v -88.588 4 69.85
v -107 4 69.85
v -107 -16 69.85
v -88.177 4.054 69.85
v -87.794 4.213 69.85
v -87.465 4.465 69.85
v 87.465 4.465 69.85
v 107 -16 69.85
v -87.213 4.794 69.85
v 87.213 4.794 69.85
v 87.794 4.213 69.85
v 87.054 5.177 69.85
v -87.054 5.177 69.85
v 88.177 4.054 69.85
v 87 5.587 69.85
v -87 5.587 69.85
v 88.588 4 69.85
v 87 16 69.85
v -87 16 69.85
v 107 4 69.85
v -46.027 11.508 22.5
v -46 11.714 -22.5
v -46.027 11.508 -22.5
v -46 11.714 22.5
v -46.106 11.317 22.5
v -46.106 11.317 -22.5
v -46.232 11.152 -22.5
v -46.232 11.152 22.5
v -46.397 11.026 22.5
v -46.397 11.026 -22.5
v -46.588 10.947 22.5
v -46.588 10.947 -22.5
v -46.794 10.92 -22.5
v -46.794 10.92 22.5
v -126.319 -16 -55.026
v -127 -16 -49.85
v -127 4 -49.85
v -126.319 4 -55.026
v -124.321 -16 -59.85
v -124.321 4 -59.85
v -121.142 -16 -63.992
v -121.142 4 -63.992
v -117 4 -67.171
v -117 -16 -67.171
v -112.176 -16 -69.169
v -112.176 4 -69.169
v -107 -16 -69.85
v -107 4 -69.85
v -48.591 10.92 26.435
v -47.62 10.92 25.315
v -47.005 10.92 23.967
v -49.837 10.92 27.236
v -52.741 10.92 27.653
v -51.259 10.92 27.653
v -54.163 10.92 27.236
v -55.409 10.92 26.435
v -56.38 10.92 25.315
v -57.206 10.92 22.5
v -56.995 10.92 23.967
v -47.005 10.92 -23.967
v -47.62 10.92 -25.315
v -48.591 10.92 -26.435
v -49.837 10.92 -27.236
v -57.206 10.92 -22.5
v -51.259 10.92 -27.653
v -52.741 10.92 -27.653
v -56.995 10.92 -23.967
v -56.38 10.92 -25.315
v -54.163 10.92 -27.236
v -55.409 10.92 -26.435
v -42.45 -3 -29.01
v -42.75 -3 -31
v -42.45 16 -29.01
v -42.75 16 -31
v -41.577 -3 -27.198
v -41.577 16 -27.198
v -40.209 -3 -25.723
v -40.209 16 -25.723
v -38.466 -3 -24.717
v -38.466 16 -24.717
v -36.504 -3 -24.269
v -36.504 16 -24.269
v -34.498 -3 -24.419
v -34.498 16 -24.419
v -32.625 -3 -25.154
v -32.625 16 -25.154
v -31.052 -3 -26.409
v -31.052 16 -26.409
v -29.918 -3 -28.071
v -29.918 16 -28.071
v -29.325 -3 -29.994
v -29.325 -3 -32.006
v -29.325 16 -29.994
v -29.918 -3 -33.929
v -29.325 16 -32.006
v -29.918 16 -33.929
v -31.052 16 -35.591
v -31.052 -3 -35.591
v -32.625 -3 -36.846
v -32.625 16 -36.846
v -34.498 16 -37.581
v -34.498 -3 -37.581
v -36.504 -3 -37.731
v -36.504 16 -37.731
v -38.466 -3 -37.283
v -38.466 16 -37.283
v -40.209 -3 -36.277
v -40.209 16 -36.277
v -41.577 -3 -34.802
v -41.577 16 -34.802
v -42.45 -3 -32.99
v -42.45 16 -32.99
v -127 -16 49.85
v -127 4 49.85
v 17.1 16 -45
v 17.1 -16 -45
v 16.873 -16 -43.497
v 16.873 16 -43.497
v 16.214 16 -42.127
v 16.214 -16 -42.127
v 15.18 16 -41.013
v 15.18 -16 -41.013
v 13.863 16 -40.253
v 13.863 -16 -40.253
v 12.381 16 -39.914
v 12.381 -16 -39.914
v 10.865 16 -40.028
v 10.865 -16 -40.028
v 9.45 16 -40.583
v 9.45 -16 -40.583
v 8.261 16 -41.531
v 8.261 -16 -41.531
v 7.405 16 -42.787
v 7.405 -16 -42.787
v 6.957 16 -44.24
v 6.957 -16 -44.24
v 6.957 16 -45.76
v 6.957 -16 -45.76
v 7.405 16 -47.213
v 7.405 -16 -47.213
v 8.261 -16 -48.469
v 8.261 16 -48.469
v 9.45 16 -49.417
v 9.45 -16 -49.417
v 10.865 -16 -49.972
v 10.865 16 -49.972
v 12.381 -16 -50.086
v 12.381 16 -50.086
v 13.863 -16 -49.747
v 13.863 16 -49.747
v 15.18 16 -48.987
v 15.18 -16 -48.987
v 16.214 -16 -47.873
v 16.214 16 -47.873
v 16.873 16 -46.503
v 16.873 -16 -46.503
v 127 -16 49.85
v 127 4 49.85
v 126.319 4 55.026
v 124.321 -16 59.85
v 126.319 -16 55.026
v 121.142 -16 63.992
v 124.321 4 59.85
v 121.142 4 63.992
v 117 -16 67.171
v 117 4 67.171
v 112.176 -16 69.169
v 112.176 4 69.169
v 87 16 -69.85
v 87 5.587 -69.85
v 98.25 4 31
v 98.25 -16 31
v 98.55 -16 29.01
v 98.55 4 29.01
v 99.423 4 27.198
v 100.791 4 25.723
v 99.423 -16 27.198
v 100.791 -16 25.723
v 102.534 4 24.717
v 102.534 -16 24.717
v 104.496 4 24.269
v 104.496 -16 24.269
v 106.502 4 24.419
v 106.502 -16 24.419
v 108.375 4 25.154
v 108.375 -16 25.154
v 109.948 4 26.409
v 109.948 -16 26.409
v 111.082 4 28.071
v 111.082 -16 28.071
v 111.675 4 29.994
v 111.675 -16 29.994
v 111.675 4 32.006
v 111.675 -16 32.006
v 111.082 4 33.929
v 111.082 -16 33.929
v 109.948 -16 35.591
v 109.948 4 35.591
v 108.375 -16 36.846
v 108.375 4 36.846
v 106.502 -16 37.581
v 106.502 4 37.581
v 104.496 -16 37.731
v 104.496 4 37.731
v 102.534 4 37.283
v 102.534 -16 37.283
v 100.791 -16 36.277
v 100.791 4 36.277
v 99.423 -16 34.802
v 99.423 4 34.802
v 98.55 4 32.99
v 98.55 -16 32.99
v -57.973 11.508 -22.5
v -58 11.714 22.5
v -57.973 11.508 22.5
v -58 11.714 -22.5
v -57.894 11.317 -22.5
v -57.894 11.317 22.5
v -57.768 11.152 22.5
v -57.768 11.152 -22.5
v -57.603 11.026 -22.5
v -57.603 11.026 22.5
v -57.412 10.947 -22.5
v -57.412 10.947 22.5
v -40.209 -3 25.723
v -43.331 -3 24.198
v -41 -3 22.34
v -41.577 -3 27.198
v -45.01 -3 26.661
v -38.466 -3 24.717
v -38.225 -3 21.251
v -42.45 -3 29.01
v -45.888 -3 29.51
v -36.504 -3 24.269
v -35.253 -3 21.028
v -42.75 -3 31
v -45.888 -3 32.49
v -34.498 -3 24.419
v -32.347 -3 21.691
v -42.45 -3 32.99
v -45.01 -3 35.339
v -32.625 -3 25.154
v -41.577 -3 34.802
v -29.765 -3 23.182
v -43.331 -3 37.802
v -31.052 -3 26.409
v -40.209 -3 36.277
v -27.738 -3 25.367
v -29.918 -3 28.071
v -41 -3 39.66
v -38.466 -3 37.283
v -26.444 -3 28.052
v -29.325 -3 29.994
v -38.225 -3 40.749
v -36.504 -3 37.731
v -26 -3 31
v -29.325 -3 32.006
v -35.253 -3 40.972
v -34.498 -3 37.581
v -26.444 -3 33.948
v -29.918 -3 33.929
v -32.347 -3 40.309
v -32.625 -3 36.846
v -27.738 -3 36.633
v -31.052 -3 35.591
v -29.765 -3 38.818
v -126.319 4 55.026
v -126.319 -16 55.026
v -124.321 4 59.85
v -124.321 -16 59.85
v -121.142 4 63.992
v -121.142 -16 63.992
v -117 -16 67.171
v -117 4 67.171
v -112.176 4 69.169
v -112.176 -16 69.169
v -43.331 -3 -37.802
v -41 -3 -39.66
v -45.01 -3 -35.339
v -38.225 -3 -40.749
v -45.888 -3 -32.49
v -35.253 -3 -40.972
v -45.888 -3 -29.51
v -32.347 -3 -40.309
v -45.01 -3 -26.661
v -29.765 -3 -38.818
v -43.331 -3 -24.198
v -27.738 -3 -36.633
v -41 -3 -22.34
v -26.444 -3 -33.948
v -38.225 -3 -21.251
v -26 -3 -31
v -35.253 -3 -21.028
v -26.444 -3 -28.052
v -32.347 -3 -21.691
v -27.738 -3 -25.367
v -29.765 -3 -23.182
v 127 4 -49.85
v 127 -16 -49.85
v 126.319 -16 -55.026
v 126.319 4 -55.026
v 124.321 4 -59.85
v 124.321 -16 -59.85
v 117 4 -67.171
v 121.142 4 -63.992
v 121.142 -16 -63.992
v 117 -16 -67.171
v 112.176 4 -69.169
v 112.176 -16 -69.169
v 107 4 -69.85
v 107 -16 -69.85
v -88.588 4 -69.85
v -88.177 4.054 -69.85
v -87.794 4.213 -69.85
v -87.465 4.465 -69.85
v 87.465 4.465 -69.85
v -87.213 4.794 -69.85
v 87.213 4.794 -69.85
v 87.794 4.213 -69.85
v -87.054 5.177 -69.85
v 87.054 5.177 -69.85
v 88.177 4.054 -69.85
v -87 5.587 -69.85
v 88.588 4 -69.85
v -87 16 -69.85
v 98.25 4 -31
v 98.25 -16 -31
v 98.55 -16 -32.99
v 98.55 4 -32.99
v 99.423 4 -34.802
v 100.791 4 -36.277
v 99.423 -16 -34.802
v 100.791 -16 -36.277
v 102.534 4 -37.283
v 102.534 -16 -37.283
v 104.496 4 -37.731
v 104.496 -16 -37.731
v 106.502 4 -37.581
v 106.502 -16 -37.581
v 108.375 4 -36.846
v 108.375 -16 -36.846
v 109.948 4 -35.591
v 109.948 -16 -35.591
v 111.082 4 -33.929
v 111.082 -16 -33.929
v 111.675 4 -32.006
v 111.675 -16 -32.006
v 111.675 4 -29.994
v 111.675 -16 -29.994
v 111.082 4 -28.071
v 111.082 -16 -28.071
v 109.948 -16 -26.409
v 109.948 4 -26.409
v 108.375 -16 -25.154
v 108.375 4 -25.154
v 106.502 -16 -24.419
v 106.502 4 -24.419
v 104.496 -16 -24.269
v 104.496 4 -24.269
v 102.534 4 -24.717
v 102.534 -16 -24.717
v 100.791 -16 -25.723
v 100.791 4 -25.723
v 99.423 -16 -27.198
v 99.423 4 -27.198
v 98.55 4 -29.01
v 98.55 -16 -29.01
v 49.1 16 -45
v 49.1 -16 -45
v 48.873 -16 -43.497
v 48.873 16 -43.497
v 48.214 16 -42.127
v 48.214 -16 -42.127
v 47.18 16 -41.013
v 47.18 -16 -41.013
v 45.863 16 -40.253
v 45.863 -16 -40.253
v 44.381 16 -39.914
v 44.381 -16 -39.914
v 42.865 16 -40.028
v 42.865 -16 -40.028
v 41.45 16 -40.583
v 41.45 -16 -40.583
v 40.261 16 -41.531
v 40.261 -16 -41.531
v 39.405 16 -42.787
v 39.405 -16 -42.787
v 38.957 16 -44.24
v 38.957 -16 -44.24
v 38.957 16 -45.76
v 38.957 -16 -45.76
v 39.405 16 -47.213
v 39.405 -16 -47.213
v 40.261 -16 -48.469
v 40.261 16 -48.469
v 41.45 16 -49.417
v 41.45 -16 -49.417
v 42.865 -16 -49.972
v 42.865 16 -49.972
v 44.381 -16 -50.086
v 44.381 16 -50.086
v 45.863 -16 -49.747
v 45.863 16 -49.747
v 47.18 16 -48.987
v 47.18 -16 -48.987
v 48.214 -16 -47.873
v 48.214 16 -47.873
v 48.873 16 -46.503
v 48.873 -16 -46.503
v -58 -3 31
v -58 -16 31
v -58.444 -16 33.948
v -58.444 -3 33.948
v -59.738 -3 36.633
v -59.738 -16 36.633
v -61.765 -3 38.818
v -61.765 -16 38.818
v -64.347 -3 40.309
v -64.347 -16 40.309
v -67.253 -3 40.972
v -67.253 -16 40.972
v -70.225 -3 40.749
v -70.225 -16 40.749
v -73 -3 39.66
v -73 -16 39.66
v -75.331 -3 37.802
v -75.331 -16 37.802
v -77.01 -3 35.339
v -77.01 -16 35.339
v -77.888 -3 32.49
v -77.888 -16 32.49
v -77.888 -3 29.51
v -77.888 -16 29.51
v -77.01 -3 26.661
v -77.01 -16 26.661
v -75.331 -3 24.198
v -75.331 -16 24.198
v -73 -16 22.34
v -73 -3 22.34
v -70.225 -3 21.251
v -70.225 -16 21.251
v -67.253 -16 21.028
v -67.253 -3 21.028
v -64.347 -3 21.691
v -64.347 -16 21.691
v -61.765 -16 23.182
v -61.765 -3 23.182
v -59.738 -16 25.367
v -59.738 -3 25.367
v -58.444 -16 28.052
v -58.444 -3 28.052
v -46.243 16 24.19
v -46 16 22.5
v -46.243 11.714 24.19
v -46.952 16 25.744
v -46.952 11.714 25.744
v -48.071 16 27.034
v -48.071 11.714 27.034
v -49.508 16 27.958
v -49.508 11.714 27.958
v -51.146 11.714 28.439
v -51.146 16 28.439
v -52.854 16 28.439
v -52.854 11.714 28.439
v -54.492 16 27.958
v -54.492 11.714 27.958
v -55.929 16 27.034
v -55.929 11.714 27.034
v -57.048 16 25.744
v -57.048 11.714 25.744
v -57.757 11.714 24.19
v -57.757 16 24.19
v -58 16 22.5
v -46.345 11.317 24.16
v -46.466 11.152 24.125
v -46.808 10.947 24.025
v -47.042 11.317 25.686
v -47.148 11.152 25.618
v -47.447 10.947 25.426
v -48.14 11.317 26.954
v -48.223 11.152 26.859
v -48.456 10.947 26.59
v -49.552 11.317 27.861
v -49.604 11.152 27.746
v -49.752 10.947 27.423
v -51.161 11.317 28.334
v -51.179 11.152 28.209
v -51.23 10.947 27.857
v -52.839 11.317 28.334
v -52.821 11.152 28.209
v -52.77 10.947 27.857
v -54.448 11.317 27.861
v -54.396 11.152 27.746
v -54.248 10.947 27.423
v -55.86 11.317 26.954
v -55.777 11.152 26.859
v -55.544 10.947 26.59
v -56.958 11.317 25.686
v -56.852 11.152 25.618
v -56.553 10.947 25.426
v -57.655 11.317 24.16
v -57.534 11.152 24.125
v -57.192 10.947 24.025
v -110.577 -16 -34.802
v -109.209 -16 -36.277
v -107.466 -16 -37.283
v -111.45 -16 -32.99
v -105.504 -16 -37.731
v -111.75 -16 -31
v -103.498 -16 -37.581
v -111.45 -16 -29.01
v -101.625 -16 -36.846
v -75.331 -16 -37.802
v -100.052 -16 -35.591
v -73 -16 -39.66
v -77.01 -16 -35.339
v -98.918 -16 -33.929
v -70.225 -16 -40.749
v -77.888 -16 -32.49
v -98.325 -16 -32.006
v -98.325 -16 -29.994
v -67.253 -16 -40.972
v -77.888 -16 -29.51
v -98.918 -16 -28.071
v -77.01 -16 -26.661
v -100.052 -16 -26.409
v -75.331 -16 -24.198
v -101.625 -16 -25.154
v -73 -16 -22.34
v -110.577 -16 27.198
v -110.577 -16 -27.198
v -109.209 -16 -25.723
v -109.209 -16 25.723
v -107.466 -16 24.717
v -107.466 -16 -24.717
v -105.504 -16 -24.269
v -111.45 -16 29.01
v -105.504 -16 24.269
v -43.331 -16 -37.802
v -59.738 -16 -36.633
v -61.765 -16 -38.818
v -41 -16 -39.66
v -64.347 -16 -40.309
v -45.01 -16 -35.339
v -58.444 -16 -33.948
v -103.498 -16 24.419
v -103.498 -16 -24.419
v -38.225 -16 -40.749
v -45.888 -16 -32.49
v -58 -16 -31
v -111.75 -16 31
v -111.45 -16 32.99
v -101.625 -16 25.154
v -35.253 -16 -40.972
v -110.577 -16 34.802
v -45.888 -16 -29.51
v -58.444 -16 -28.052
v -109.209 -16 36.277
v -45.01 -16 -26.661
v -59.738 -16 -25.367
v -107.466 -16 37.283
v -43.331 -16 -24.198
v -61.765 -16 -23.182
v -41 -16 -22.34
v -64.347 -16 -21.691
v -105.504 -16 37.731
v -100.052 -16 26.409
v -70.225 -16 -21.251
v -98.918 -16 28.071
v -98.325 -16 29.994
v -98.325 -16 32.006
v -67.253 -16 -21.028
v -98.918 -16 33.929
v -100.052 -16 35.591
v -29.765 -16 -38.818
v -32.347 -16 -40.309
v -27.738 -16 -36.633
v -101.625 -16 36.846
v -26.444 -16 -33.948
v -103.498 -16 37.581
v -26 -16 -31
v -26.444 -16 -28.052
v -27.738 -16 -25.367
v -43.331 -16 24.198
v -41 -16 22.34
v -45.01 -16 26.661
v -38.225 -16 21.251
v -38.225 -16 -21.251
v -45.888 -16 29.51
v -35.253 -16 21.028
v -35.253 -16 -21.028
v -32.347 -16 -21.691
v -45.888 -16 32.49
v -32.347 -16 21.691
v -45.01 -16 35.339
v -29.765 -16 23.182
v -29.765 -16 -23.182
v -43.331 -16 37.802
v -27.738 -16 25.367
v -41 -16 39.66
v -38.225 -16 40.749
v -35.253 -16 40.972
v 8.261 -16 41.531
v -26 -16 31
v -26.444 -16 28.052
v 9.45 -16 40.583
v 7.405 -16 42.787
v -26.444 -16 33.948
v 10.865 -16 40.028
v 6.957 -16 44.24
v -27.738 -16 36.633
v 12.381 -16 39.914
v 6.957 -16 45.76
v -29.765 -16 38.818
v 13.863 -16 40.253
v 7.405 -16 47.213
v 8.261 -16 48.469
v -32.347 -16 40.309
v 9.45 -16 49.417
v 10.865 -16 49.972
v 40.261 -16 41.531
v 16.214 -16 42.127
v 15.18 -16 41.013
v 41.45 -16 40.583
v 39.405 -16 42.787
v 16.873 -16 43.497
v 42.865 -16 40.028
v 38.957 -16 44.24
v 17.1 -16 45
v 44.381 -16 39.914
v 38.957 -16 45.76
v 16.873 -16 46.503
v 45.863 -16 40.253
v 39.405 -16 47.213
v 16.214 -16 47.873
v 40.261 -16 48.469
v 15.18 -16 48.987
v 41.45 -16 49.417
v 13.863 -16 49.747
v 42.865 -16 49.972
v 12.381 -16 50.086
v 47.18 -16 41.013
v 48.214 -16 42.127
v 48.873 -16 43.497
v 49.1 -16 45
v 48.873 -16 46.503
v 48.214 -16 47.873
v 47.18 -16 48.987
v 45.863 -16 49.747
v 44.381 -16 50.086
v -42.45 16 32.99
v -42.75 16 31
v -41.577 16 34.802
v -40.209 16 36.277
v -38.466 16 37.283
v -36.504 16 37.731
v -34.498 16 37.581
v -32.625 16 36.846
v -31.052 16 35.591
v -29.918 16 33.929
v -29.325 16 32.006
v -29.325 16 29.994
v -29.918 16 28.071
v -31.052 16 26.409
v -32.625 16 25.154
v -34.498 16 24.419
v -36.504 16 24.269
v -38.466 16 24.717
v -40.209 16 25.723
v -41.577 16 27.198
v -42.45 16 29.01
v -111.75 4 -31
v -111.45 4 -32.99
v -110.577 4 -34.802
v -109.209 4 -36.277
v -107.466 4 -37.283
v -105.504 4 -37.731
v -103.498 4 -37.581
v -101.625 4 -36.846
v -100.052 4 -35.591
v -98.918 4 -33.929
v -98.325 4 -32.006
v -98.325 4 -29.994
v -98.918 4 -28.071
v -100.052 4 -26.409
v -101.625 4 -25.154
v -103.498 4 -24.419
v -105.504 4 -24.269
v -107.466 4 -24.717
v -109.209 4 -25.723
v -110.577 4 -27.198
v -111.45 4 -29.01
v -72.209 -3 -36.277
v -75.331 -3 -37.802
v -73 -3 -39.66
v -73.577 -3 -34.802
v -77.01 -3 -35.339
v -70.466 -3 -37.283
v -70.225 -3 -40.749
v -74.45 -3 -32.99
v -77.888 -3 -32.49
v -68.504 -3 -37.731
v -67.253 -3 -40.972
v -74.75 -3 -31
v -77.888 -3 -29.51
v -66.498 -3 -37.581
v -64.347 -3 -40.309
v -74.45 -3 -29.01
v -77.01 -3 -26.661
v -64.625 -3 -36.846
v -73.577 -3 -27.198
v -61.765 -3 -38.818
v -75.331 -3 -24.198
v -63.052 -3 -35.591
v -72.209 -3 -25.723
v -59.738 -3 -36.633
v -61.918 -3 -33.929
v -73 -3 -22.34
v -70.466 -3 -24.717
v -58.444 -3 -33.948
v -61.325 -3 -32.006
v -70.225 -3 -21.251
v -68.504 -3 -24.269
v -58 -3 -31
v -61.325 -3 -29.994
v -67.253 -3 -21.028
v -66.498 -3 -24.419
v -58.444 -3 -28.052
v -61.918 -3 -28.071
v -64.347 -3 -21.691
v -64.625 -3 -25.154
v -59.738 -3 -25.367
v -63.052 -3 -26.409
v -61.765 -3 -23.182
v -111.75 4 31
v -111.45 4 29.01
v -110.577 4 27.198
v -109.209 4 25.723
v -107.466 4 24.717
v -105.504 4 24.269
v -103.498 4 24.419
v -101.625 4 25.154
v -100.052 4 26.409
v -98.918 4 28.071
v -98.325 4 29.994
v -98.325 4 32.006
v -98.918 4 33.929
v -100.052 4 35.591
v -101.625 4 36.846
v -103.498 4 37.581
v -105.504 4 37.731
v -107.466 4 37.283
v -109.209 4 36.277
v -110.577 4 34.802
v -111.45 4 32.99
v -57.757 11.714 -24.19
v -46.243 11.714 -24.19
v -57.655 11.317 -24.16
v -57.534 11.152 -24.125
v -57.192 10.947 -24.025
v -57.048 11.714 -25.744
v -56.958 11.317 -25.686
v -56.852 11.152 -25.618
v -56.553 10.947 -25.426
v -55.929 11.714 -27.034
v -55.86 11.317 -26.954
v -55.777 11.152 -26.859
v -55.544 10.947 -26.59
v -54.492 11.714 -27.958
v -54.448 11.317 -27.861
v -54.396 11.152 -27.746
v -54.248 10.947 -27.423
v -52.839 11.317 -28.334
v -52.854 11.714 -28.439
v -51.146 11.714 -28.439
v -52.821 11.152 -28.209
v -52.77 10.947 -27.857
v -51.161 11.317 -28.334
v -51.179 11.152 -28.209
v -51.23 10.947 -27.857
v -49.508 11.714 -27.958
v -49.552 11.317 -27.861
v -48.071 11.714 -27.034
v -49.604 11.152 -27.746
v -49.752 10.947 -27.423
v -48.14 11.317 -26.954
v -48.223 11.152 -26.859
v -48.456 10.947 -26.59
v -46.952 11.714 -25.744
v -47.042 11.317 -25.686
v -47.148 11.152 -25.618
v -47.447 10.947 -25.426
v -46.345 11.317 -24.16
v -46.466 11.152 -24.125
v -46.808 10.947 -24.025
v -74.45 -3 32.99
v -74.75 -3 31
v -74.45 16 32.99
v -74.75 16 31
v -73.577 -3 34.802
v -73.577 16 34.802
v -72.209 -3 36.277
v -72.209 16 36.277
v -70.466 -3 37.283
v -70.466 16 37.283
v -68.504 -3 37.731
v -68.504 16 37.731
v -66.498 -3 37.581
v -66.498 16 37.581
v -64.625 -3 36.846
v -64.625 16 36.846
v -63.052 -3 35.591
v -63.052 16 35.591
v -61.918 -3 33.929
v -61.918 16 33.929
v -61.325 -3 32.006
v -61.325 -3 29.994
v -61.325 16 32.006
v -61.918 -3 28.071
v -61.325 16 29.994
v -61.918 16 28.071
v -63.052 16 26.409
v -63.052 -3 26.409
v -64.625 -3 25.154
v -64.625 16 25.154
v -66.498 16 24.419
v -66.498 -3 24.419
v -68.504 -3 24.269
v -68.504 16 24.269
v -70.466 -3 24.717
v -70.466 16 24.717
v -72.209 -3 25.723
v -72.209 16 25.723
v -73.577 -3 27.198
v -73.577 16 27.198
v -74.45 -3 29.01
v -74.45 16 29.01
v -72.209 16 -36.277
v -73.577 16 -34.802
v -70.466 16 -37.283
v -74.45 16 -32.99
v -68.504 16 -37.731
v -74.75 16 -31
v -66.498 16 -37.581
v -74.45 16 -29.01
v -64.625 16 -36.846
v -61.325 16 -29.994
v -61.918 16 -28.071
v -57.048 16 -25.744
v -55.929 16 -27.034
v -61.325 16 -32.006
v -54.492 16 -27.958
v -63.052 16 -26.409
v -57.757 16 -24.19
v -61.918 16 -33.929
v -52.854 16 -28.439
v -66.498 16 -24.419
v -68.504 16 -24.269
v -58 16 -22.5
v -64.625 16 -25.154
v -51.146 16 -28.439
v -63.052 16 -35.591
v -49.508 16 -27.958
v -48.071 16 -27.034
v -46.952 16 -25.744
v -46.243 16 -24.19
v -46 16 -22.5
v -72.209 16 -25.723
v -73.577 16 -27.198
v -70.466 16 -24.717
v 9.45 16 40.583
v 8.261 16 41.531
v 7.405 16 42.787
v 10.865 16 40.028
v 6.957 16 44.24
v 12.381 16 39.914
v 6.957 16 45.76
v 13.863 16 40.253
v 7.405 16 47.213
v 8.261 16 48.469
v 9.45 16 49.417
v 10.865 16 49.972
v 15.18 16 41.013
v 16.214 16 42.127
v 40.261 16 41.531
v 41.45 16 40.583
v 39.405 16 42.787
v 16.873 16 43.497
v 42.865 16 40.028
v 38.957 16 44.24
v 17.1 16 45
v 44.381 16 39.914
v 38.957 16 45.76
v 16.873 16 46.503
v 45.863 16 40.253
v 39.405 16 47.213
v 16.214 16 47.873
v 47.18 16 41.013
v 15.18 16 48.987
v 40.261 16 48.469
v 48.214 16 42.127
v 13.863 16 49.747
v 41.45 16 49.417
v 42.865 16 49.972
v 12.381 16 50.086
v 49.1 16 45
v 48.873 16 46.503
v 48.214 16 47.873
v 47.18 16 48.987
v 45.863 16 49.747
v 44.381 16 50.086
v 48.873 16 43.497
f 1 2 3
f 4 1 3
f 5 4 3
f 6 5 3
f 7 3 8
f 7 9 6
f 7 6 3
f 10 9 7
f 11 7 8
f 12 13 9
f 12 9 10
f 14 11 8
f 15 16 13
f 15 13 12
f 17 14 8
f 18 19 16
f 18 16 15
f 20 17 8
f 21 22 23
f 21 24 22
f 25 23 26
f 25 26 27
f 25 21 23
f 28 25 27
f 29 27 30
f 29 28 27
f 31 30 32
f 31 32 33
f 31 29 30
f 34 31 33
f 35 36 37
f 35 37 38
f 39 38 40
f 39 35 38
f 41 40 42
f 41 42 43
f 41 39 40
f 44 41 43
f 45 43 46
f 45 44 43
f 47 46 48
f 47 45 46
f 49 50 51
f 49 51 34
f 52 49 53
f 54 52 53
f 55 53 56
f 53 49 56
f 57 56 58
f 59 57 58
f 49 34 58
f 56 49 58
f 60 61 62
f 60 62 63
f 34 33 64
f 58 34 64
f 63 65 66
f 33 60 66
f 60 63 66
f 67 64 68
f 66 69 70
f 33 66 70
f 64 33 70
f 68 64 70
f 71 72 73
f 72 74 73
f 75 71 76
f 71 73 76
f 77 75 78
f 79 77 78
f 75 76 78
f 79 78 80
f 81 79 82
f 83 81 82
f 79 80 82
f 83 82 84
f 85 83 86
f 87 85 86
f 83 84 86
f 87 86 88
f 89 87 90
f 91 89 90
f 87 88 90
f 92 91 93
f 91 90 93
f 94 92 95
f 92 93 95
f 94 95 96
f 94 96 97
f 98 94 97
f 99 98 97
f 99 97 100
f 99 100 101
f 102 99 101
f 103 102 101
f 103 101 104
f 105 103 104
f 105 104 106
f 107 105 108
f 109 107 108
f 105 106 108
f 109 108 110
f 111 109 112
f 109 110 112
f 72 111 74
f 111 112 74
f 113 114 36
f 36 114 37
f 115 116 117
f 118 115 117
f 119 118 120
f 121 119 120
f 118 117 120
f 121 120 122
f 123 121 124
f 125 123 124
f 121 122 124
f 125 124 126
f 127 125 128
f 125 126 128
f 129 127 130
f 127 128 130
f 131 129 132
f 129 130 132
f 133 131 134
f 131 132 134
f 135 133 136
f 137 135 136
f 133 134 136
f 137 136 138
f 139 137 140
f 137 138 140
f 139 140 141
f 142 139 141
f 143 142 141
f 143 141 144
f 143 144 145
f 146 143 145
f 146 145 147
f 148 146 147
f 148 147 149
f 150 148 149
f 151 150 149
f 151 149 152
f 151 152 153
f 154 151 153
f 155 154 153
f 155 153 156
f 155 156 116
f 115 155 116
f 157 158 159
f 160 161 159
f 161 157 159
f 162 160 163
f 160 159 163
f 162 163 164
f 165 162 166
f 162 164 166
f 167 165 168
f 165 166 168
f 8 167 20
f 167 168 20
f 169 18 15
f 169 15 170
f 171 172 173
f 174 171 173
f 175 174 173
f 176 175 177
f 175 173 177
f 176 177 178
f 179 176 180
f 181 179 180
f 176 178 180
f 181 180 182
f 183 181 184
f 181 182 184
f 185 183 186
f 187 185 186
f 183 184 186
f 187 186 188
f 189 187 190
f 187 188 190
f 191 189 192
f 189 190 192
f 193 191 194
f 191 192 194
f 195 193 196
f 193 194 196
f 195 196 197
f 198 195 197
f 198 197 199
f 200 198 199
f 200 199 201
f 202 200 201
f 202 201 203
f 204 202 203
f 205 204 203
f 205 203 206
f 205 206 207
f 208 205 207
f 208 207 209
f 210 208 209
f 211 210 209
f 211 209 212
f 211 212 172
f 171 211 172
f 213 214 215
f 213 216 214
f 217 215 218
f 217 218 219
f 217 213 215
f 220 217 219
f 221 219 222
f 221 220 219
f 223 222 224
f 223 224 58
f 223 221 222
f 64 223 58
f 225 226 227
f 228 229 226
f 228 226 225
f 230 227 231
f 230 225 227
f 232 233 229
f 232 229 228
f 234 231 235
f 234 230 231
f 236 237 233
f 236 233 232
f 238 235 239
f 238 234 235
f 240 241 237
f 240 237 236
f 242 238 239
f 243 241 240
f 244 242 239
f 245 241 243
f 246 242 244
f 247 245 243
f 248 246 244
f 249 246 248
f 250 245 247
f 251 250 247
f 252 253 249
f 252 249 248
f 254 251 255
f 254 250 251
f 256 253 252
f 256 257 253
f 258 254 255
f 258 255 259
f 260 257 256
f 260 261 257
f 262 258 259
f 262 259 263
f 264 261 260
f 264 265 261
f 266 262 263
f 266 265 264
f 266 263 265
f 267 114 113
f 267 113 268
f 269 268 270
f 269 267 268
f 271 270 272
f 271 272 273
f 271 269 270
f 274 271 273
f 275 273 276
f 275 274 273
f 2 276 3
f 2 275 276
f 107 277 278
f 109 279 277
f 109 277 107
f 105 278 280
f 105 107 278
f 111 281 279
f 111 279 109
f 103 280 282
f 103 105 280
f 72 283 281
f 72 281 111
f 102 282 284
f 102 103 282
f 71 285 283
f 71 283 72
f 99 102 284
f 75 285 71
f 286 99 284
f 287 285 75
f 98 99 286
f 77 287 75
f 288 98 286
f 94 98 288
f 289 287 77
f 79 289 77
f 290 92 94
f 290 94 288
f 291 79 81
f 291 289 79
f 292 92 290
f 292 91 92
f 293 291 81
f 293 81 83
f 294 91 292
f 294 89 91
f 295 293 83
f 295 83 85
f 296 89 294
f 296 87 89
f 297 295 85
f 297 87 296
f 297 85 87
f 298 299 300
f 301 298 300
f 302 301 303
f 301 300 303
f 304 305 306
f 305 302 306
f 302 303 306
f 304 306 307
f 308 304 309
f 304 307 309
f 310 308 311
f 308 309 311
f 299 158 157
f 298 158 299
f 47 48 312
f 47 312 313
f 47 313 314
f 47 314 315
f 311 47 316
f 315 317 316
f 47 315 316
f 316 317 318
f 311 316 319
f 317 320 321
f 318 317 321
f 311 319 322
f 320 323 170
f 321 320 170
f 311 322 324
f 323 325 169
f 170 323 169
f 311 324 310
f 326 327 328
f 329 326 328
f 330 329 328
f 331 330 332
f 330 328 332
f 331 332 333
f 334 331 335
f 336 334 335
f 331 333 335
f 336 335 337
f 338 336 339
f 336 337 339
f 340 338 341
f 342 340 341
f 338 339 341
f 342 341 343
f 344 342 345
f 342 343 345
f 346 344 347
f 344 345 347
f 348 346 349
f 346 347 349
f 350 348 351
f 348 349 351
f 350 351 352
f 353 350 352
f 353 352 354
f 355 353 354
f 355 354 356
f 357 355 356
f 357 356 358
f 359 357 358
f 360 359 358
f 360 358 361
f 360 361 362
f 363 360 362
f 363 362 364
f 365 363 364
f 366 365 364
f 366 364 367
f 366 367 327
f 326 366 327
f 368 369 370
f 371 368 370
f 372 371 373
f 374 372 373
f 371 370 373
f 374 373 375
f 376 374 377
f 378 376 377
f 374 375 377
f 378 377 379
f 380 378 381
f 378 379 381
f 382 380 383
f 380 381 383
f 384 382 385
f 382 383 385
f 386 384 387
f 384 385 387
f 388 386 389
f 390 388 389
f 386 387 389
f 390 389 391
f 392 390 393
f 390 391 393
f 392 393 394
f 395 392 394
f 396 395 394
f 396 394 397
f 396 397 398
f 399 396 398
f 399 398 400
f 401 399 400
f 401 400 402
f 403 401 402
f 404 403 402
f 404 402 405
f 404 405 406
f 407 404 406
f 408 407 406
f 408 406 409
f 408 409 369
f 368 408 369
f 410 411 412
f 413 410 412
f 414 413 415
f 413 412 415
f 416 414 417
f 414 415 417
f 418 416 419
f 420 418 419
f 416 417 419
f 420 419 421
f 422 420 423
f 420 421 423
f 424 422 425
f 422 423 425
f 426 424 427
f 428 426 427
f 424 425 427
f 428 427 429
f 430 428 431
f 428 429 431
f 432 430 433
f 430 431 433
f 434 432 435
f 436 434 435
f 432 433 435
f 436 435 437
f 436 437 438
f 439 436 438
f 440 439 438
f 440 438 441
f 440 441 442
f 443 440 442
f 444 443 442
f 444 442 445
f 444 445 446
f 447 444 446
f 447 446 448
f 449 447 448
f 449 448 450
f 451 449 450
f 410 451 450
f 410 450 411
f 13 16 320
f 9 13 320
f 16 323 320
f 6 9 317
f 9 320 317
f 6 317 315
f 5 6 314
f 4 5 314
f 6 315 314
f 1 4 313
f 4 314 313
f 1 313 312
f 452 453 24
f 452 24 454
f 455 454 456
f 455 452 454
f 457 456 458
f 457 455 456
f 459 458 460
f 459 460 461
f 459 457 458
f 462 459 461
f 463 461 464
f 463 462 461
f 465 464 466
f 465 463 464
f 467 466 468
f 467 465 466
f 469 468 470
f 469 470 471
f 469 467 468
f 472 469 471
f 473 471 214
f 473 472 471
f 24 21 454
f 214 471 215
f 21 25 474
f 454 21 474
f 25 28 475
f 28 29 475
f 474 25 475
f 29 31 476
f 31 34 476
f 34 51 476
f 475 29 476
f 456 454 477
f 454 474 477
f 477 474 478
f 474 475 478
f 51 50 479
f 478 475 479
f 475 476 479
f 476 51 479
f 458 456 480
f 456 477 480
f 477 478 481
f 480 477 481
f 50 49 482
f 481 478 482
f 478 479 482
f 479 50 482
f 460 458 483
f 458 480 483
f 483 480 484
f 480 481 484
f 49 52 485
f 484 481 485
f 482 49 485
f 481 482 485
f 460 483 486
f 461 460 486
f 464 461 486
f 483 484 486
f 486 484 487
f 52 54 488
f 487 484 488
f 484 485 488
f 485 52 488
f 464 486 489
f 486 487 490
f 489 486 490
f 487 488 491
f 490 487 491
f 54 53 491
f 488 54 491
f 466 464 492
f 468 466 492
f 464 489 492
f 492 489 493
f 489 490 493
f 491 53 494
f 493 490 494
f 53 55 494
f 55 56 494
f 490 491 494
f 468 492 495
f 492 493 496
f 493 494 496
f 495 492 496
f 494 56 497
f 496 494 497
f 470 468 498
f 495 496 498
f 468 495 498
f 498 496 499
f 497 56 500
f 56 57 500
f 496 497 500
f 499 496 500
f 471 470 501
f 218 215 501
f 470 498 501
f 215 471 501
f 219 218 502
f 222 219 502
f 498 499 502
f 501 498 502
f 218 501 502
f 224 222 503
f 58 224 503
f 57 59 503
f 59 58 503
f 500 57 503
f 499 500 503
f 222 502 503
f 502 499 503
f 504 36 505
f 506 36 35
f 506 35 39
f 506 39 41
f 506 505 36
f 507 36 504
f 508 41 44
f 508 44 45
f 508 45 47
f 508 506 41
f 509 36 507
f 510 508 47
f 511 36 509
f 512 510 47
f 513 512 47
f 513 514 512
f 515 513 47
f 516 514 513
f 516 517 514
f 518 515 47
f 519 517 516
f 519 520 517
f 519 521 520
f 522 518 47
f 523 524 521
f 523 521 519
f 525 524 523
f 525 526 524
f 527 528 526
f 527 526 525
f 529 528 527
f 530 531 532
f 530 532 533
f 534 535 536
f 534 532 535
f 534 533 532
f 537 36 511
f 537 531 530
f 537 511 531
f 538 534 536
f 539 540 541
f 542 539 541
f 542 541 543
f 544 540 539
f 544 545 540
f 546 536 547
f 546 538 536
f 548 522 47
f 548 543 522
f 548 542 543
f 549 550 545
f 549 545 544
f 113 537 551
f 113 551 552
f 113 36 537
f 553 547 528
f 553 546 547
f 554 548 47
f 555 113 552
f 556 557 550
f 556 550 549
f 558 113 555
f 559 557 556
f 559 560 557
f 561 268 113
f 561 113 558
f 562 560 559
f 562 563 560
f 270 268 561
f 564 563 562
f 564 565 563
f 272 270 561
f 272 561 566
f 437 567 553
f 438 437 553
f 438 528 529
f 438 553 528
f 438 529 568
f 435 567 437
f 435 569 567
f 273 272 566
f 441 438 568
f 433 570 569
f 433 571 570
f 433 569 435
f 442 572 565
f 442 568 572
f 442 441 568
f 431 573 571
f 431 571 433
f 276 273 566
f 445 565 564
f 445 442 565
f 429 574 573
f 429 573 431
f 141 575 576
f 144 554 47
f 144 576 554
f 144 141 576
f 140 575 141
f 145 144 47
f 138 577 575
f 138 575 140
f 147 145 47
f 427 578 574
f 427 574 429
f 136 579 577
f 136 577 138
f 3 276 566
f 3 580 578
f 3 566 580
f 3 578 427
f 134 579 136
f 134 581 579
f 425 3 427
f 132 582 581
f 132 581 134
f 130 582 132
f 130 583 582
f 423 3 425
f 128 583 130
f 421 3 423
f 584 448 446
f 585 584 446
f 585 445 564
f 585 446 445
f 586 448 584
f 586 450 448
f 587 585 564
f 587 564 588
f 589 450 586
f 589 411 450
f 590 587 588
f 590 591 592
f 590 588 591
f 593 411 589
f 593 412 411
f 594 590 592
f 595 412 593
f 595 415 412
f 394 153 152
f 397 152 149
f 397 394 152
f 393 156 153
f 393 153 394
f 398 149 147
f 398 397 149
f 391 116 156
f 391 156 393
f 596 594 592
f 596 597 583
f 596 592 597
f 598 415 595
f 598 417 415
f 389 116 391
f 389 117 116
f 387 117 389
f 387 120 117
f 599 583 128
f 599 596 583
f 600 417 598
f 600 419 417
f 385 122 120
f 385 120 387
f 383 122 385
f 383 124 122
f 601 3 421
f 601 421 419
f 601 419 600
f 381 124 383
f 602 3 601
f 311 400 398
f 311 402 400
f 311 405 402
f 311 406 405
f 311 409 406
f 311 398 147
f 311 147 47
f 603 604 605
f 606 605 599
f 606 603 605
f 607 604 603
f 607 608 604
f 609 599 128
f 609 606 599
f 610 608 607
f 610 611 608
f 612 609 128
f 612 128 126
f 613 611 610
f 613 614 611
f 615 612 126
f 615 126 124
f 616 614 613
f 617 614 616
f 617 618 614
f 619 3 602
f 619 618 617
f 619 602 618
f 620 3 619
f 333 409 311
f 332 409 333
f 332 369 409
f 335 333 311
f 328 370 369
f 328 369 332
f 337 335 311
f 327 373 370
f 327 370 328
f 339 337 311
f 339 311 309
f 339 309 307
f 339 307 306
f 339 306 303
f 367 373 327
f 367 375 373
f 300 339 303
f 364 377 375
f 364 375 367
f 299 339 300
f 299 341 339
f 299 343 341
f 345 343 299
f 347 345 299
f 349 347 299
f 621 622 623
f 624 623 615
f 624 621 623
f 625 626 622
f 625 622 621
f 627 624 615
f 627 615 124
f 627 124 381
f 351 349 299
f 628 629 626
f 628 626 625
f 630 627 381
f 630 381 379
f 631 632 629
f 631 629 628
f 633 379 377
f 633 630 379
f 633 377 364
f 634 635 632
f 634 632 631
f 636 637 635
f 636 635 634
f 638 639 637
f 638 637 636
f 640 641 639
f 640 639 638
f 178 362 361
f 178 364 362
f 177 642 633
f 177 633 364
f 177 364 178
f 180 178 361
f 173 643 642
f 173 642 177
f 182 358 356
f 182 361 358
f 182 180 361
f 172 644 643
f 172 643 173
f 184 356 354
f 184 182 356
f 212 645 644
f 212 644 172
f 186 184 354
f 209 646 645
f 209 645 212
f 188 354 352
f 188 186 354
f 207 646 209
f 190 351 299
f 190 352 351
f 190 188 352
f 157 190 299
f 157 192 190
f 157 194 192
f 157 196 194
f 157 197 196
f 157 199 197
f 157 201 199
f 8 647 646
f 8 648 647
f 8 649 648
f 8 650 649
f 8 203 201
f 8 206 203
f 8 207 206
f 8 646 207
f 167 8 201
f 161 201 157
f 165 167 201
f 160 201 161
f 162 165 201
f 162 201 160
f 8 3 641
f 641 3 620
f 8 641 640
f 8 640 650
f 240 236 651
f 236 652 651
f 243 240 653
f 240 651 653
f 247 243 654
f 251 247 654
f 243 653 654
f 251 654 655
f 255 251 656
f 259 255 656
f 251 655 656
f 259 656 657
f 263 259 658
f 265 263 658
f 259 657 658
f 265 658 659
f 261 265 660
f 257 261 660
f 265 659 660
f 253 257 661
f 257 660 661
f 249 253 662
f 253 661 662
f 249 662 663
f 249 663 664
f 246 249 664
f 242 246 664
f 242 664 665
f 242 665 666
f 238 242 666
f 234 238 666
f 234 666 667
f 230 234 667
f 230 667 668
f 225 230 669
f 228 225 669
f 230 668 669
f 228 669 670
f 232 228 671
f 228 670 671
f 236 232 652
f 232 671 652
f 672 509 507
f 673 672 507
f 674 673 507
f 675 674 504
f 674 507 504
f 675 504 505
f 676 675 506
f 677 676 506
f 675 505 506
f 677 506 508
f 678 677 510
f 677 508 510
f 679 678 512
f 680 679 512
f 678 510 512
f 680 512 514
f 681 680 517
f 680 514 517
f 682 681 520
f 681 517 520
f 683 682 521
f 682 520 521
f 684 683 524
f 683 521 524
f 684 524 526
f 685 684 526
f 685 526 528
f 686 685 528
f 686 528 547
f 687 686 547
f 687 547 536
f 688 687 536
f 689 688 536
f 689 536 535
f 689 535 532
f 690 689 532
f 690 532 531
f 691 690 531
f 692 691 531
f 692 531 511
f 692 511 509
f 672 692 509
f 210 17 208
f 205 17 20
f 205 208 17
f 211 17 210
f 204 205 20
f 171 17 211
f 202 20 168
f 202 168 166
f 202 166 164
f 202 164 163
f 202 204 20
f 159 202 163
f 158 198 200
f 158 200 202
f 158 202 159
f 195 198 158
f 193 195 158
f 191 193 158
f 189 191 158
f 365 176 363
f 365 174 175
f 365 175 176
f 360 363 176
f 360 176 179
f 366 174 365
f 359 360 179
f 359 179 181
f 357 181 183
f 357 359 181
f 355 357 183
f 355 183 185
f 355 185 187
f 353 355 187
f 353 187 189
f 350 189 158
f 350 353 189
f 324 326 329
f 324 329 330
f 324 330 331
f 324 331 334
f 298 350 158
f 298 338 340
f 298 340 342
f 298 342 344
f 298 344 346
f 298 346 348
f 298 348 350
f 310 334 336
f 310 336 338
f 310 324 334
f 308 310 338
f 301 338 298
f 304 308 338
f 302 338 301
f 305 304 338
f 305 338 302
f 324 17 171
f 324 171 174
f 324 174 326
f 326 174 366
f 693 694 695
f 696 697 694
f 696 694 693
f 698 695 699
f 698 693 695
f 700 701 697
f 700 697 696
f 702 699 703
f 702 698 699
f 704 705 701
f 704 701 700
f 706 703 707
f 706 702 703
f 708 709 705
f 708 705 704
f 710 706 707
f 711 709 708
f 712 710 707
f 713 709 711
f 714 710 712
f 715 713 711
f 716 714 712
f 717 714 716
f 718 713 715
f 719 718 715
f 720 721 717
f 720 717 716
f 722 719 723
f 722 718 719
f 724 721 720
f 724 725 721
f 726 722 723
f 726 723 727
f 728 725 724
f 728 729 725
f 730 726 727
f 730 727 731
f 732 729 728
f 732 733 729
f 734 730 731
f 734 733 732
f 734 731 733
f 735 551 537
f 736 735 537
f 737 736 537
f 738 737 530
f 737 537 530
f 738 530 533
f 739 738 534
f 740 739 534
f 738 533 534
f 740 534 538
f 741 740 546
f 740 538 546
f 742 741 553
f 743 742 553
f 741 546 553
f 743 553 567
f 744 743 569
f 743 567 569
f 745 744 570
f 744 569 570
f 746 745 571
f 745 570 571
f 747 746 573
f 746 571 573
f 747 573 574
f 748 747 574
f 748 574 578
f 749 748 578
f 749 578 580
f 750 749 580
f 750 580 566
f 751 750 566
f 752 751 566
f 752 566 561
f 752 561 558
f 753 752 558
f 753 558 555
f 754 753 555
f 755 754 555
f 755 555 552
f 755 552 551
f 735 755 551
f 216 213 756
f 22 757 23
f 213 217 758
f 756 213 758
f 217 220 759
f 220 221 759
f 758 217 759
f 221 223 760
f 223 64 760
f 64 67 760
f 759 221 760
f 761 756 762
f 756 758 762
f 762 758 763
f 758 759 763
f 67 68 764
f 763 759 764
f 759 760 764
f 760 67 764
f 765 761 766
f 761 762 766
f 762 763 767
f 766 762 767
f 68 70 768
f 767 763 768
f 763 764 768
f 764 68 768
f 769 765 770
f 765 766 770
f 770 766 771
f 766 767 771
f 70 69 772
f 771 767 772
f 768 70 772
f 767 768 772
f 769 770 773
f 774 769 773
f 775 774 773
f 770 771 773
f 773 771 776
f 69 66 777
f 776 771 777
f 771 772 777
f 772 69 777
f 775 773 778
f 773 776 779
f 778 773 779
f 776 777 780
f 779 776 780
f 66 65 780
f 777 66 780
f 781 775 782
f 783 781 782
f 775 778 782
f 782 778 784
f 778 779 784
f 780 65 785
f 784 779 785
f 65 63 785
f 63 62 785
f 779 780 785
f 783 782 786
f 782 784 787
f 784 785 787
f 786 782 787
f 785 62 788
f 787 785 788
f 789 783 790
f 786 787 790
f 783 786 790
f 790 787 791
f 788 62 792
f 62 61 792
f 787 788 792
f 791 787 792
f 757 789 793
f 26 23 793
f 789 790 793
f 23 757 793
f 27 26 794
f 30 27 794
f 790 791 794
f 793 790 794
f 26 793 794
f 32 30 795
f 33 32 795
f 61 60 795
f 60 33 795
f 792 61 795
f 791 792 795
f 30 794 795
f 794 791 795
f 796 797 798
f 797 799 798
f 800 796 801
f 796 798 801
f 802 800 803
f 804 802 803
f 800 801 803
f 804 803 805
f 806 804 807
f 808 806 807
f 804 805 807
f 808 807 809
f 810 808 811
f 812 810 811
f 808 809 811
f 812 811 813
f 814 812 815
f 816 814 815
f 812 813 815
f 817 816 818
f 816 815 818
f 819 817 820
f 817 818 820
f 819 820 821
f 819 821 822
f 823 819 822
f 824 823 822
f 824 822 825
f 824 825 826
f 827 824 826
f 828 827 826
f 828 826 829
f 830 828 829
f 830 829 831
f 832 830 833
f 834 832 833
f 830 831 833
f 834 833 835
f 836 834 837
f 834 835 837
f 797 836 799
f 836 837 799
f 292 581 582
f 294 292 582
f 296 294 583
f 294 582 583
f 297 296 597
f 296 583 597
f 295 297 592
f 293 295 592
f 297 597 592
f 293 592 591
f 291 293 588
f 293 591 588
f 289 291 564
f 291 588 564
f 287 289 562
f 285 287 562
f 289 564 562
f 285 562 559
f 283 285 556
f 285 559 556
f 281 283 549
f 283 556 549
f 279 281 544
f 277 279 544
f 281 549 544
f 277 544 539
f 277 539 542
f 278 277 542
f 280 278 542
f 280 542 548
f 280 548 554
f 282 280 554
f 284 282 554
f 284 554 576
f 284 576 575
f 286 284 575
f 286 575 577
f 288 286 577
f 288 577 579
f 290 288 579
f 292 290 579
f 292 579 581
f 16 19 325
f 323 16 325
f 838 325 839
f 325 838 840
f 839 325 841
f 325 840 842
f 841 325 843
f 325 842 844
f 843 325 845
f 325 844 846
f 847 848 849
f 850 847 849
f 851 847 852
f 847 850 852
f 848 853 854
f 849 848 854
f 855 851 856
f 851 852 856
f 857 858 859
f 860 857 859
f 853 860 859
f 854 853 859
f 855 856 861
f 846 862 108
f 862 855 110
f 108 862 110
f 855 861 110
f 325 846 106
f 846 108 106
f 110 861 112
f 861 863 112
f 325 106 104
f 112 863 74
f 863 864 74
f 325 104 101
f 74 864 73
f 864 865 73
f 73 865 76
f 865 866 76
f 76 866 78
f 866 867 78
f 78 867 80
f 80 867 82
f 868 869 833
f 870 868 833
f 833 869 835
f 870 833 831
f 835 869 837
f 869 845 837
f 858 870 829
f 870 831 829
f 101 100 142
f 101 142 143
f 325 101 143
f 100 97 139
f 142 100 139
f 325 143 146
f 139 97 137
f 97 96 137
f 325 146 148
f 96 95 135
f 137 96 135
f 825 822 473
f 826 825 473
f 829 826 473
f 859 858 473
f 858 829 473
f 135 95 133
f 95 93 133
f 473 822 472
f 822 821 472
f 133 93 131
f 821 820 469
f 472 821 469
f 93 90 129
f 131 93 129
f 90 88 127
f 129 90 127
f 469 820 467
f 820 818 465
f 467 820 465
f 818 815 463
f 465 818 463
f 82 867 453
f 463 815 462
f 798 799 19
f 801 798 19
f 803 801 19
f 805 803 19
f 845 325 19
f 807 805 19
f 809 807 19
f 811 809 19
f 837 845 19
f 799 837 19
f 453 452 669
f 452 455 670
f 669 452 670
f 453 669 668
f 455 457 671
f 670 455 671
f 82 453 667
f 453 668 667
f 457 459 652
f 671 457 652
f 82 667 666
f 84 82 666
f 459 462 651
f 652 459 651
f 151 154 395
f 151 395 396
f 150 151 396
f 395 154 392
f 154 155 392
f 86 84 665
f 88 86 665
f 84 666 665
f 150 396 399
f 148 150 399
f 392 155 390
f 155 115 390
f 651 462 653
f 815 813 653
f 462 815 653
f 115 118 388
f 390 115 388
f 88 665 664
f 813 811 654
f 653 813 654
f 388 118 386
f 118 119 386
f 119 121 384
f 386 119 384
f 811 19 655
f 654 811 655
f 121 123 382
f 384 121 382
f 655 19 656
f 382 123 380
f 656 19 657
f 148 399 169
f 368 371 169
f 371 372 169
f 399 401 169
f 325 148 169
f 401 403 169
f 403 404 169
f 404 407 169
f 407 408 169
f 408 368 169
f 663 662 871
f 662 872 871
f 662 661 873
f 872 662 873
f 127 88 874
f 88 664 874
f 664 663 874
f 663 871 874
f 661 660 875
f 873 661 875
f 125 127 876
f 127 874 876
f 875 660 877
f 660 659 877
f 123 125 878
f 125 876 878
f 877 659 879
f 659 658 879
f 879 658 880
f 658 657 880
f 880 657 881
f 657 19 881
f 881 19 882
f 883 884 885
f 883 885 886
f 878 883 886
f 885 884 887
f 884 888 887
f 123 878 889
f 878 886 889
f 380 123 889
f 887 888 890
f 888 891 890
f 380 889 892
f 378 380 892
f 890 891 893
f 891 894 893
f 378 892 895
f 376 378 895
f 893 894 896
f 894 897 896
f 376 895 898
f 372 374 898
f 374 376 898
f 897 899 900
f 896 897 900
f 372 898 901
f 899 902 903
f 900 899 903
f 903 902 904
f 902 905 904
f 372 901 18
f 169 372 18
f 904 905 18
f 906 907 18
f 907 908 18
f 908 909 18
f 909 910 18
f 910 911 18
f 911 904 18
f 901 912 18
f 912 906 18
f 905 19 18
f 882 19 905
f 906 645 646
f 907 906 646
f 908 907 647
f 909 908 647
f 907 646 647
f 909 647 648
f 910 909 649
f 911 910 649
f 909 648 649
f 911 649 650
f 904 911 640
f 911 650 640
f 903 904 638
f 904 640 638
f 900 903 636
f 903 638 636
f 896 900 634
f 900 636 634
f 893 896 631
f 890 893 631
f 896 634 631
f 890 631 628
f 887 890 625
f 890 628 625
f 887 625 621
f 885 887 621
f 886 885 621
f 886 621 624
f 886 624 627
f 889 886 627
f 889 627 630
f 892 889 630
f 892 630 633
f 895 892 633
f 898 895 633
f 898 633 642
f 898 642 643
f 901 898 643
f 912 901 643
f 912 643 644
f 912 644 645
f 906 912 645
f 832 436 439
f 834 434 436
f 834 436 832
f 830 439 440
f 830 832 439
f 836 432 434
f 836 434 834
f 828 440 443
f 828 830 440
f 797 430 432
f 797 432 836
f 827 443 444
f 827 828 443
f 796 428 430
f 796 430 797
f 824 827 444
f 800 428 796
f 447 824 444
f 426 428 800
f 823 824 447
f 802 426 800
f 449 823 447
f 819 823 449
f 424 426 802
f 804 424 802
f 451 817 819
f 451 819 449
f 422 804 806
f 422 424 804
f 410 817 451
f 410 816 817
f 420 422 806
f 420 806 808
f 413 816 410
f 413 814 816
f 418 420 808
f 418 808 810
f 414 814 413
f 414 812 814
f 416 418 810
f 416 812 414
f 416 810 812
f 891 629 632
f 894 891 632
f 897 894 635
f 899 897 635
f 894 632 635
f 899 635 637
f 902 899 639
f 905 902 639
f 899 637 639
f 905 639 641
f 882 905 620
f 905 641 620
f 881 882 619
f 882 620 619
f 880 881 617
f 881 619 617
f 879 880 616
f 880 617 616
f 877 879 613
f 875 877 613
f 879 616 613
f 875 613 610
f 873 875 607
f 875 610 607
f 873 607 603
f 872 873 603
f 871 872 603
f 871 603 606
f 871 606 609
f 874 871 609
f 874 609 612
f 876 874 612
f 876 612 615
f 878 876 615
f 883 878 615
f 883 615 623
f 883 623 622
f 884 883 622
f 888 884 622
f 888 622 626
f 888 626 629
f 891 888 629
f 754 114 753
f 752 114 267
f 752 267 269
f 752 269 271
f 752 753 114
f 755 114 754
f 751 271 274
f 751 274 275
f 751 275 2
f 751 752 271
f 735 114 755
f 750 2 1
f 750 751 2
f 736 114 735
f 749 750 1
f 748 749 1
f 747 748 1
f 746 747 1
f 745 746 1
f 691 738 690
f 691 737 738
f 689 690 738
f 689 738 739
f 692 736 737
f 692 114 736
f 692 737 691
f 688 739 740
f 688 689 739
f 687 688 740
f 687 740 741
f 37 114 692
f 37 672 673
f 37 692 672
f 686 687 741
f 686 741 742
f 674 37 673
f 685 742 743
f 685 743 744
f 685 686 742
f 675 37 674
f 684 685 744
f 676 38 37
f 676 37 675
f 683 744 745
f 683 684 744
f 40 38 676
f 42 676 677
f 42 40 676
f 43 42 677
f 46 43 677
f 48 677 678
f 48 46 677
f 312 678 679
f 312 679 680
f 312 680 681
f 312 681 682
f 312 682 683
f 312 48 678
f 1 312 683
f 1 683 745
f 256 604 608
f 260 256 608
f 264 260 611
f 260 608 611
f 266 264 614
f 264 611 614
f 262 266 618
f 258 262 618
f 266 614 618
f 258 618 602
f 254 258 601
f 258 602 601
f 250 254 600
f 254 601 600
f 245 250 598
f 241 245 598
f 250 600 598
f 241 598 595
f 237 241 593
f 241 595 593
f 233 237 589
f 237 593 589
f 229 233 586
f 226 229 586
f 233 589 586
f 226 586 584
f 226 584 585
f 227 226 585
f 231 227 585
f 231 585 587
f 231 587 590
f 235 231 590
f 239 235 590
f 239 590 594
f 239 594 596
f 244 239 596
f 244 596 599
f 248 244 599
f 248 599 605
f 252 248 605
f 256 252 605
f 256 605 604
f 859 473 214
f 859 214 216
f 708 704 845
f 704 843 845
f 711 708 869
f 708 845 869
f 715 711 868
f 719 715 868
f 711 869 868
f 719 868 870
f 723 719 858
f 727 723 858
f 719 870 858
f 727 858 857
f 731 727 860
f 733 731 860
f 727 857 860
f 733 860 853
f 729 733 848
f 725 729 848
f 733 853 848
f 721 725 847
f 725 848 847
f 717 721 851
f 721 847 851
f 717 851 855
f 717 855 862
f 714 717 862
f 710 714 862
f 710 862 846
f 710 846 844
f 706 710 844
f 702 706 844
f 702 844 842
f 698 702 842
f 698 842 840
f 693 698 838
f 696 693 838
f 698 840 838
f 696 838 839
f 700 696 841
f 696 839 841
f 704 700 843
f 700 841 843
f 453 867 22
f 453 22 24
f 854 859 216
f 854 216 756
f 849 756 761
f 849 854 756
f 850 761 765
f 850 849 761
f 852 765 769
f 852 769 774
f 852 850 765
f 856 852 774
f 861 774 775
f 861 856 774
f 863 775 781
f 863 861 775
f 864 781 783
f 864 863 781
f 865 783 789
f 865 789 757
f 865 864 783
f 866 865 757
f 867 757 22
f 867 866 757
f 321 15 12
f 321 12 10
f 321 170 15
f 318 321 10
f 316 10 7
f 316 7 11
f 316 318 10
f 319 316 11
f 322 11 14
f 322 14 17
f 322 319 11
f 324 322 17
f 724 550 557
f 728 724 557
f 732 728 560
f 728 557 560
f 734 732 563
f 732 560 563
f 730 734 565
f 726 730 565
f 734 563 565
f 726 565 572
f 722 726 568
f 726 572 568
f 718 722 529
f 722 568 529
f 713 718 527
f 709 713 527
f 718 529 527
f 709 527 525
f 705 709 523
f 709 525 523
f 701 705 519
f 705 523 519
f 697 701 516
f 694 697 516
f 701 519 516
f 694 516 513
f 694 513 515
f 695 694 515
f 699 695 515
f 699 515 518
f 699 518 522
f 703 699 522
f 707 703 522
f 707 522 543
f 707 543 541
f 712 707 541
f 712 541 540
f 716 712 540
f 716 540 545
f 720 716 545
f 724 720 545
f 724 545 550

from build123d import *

# Parameters (mm, degrees)
SKETCH1_W                                            = 254
SKETCH1_H                                            = 139.7
BOSS_EXTRUDE1_DEPTH                                  = 19.05
FILLET1_R                                            = 20
SKETCH2_W                                            = 254
SKETCH2_H                                            = 3.05
CUT_EXTRUDE1_DEPTH                                   = 190.757720528
SKETCH8_W                                            = 40
SKETCH8_H                                            = 139.7
CUT_EXTRUDE2_DEPTH                                   = 12
M12_TAPPED_HOLE2_D                                   = 10.2
M12_TAPPED_HOLE2_DEPTH                               = 43.99
M12_TAPPED_HOLE2_TIP                                 = 3.064389157
M12_CLEARANCE_HOLE1_D                                = 13.5
CBORE_FOR_M12_HEX_SOCKET_HEAD_CAP_SCREW1_D           = 13.5
CBORE_FOR_M12_HEX_SOCKET_HEAD_CAP_SCREW1_CBORE_D     = 20
CBORE_FOR_M12_HEX_SOCKET_HEAD_CAP_SCREW1_CBORE_DEPTH = 13
CUT_EXTRUDE3_DEPTH                                   = 5.08
FILLET2_R                                            = 0.79375
FILLET3_R                                            = 1.5875


with BuildPart() as part:
    # Sketch1 → Boss-Extrude1 (new, symmetric)
    with BuildSketch(Plane(origin=(0, 0, 0), x_dir=(1, 0, 0), z_dir=(0, 1, 0))):
        Rectangle(SKETCH1_W, SKETCH1_H)
    extrude(amount=BOSS_EXTRUDE1_DEPTH, both=True)

    # Fillet1
    fillet1_edges = [part.edges().sort_by_distance(p)[0] for p in [
        (-127, 0, -69.85),
        (127, 0, -69.85),
        (127, 0, 69.85),
        (-127, 0, 69.85),
    ]]
    fillet(fillet1_edges, radius=FILLET1_R)

    # Sketch2 → Cut-Extrude1 (cut, through all)
    with BuildSketch(Plane.XY.offset(69.85)):
        with Locations((0, 17.525)):
            Rectangle(SKETCH2_W, SKETCH2_H)
        with Locations((0, -17.525)):
            Rectangle(SKETCH2_W, SKETCH2_H)
    extrude(amount=-CUT_EXTRUDE1_DEPTH, mode=Mode.SUBTRACT)

    # Sketch8 → Cut-Extrude2 (cut)
    with BuildSketch(Plane(origin=(0, 16, 0), x_dir=(1, 0, 0), z_dir=(0, 1, 0))):
        with Locations((-107, 0)):
            Rectangle(SKETCH8_W, SKETCH8_H)
        with Locations((107, 0)):
            Rectangle(SKETCH8_W, SKETCH8_H)
    extrude(amount=-CUT_EXTRUDE2_DEPTH, mode=Mode.SUBTRACT)

    # M12 Tapped Hole2
    with Locations(Plane(origin=(0, 16, 0), x_dir=(-1, 0, 0), z_dir=(0, 1, 0))):
        with Locations((-12, 45), (-12, -45), (-44, -45), (-44, 45)):
            Hole(M12_TAPPED_HOLE2_D / 2, depth=M12_TAPPED_HOLE2_DEPTH)
            with Locations((0, 0, -(M12_TAPPED_HOLE2_DEPTH + M12_TAPPED_HOLE2_TIP / 2))):  # 118° drill point
                Cone(0, M12_TAPPED_HOLE2_D / 2, M12_TAPPED_HOLE2_TIP, mode=Mode.SUBTRACT)

    # M12 Clearance Hole1 (through all)
    with Locations(Plane(origin=(0, 4, 0), x_dir=(1, 0, 0), z_dir=(0, 1, 0))):
        with Locations((-105, 31), (-105, -31), (105, 31), (105, -31)):
            Hole(M12_CLEARANCE_HOLE1_D / 2)

    # CBORE for M12 Hex Socket Head Cap Screw1 (through all)
    with Locations(Plane.XZ.offset(16)):
        with Locations((-36, -31), (-68, 31), (-36, 31), (-68, -31)):
            CounterBoreHole(CBORE_FOR_M12_HEX_SOCKET_HEAD_CAP_SCREW1_D / 2, CBORE_FOR_M12_HEX_SOCKET_HEAD_CAP_SCREW1_CBORE_D / 2, CBORE_FOR_M12_HEX_SOCKET_HEAD_CAP_SCREW1_CBORE_DEPTH)

    # Sketch11 → Cut-Extrude3 (cut)
    with BuildSketch(Plane(origin=(0, 16, 0), x_dir=(1, 0, 0), z_dir=(0, 1, 0))):
        with BuildLine():
            Line((-46, 22.5), (-46, -22.5))
            ThreePointArc((-46, -22.5), (-52, -28.5), (-58, -22.5))
            Line((-58, -22.5), (-58, 22.5))
            ThreePointArc((-58, 22.5), (-52, 28.5), (-46, 22.5))
        make_face()
    extrude(amount=-CUT_EXTRUDE3_DEPTH, mode=Mode.SUBTRACT)

    # Fillet2
    fillet2_edges = [part.edges().sort_by_distance(p)[0] for p in [
        (-52, 10.92, -28.5),
        (-46, 10.92, 0),
        (-52, 10.92, 28.5),
        (-58, 10.92, 0),
    ]]
    fillet(fillet2_edges, radius=FILLET2_R)

    # Fillet3
    fillet3_edges = [part.edges().sort_by_distance(p)[0] for p in [
        (-87, 4, 0),
        (87, 4, 0),
    ]]
    fillet(fillet3_edges, radius=FILLET3_R)


solid = part.part
